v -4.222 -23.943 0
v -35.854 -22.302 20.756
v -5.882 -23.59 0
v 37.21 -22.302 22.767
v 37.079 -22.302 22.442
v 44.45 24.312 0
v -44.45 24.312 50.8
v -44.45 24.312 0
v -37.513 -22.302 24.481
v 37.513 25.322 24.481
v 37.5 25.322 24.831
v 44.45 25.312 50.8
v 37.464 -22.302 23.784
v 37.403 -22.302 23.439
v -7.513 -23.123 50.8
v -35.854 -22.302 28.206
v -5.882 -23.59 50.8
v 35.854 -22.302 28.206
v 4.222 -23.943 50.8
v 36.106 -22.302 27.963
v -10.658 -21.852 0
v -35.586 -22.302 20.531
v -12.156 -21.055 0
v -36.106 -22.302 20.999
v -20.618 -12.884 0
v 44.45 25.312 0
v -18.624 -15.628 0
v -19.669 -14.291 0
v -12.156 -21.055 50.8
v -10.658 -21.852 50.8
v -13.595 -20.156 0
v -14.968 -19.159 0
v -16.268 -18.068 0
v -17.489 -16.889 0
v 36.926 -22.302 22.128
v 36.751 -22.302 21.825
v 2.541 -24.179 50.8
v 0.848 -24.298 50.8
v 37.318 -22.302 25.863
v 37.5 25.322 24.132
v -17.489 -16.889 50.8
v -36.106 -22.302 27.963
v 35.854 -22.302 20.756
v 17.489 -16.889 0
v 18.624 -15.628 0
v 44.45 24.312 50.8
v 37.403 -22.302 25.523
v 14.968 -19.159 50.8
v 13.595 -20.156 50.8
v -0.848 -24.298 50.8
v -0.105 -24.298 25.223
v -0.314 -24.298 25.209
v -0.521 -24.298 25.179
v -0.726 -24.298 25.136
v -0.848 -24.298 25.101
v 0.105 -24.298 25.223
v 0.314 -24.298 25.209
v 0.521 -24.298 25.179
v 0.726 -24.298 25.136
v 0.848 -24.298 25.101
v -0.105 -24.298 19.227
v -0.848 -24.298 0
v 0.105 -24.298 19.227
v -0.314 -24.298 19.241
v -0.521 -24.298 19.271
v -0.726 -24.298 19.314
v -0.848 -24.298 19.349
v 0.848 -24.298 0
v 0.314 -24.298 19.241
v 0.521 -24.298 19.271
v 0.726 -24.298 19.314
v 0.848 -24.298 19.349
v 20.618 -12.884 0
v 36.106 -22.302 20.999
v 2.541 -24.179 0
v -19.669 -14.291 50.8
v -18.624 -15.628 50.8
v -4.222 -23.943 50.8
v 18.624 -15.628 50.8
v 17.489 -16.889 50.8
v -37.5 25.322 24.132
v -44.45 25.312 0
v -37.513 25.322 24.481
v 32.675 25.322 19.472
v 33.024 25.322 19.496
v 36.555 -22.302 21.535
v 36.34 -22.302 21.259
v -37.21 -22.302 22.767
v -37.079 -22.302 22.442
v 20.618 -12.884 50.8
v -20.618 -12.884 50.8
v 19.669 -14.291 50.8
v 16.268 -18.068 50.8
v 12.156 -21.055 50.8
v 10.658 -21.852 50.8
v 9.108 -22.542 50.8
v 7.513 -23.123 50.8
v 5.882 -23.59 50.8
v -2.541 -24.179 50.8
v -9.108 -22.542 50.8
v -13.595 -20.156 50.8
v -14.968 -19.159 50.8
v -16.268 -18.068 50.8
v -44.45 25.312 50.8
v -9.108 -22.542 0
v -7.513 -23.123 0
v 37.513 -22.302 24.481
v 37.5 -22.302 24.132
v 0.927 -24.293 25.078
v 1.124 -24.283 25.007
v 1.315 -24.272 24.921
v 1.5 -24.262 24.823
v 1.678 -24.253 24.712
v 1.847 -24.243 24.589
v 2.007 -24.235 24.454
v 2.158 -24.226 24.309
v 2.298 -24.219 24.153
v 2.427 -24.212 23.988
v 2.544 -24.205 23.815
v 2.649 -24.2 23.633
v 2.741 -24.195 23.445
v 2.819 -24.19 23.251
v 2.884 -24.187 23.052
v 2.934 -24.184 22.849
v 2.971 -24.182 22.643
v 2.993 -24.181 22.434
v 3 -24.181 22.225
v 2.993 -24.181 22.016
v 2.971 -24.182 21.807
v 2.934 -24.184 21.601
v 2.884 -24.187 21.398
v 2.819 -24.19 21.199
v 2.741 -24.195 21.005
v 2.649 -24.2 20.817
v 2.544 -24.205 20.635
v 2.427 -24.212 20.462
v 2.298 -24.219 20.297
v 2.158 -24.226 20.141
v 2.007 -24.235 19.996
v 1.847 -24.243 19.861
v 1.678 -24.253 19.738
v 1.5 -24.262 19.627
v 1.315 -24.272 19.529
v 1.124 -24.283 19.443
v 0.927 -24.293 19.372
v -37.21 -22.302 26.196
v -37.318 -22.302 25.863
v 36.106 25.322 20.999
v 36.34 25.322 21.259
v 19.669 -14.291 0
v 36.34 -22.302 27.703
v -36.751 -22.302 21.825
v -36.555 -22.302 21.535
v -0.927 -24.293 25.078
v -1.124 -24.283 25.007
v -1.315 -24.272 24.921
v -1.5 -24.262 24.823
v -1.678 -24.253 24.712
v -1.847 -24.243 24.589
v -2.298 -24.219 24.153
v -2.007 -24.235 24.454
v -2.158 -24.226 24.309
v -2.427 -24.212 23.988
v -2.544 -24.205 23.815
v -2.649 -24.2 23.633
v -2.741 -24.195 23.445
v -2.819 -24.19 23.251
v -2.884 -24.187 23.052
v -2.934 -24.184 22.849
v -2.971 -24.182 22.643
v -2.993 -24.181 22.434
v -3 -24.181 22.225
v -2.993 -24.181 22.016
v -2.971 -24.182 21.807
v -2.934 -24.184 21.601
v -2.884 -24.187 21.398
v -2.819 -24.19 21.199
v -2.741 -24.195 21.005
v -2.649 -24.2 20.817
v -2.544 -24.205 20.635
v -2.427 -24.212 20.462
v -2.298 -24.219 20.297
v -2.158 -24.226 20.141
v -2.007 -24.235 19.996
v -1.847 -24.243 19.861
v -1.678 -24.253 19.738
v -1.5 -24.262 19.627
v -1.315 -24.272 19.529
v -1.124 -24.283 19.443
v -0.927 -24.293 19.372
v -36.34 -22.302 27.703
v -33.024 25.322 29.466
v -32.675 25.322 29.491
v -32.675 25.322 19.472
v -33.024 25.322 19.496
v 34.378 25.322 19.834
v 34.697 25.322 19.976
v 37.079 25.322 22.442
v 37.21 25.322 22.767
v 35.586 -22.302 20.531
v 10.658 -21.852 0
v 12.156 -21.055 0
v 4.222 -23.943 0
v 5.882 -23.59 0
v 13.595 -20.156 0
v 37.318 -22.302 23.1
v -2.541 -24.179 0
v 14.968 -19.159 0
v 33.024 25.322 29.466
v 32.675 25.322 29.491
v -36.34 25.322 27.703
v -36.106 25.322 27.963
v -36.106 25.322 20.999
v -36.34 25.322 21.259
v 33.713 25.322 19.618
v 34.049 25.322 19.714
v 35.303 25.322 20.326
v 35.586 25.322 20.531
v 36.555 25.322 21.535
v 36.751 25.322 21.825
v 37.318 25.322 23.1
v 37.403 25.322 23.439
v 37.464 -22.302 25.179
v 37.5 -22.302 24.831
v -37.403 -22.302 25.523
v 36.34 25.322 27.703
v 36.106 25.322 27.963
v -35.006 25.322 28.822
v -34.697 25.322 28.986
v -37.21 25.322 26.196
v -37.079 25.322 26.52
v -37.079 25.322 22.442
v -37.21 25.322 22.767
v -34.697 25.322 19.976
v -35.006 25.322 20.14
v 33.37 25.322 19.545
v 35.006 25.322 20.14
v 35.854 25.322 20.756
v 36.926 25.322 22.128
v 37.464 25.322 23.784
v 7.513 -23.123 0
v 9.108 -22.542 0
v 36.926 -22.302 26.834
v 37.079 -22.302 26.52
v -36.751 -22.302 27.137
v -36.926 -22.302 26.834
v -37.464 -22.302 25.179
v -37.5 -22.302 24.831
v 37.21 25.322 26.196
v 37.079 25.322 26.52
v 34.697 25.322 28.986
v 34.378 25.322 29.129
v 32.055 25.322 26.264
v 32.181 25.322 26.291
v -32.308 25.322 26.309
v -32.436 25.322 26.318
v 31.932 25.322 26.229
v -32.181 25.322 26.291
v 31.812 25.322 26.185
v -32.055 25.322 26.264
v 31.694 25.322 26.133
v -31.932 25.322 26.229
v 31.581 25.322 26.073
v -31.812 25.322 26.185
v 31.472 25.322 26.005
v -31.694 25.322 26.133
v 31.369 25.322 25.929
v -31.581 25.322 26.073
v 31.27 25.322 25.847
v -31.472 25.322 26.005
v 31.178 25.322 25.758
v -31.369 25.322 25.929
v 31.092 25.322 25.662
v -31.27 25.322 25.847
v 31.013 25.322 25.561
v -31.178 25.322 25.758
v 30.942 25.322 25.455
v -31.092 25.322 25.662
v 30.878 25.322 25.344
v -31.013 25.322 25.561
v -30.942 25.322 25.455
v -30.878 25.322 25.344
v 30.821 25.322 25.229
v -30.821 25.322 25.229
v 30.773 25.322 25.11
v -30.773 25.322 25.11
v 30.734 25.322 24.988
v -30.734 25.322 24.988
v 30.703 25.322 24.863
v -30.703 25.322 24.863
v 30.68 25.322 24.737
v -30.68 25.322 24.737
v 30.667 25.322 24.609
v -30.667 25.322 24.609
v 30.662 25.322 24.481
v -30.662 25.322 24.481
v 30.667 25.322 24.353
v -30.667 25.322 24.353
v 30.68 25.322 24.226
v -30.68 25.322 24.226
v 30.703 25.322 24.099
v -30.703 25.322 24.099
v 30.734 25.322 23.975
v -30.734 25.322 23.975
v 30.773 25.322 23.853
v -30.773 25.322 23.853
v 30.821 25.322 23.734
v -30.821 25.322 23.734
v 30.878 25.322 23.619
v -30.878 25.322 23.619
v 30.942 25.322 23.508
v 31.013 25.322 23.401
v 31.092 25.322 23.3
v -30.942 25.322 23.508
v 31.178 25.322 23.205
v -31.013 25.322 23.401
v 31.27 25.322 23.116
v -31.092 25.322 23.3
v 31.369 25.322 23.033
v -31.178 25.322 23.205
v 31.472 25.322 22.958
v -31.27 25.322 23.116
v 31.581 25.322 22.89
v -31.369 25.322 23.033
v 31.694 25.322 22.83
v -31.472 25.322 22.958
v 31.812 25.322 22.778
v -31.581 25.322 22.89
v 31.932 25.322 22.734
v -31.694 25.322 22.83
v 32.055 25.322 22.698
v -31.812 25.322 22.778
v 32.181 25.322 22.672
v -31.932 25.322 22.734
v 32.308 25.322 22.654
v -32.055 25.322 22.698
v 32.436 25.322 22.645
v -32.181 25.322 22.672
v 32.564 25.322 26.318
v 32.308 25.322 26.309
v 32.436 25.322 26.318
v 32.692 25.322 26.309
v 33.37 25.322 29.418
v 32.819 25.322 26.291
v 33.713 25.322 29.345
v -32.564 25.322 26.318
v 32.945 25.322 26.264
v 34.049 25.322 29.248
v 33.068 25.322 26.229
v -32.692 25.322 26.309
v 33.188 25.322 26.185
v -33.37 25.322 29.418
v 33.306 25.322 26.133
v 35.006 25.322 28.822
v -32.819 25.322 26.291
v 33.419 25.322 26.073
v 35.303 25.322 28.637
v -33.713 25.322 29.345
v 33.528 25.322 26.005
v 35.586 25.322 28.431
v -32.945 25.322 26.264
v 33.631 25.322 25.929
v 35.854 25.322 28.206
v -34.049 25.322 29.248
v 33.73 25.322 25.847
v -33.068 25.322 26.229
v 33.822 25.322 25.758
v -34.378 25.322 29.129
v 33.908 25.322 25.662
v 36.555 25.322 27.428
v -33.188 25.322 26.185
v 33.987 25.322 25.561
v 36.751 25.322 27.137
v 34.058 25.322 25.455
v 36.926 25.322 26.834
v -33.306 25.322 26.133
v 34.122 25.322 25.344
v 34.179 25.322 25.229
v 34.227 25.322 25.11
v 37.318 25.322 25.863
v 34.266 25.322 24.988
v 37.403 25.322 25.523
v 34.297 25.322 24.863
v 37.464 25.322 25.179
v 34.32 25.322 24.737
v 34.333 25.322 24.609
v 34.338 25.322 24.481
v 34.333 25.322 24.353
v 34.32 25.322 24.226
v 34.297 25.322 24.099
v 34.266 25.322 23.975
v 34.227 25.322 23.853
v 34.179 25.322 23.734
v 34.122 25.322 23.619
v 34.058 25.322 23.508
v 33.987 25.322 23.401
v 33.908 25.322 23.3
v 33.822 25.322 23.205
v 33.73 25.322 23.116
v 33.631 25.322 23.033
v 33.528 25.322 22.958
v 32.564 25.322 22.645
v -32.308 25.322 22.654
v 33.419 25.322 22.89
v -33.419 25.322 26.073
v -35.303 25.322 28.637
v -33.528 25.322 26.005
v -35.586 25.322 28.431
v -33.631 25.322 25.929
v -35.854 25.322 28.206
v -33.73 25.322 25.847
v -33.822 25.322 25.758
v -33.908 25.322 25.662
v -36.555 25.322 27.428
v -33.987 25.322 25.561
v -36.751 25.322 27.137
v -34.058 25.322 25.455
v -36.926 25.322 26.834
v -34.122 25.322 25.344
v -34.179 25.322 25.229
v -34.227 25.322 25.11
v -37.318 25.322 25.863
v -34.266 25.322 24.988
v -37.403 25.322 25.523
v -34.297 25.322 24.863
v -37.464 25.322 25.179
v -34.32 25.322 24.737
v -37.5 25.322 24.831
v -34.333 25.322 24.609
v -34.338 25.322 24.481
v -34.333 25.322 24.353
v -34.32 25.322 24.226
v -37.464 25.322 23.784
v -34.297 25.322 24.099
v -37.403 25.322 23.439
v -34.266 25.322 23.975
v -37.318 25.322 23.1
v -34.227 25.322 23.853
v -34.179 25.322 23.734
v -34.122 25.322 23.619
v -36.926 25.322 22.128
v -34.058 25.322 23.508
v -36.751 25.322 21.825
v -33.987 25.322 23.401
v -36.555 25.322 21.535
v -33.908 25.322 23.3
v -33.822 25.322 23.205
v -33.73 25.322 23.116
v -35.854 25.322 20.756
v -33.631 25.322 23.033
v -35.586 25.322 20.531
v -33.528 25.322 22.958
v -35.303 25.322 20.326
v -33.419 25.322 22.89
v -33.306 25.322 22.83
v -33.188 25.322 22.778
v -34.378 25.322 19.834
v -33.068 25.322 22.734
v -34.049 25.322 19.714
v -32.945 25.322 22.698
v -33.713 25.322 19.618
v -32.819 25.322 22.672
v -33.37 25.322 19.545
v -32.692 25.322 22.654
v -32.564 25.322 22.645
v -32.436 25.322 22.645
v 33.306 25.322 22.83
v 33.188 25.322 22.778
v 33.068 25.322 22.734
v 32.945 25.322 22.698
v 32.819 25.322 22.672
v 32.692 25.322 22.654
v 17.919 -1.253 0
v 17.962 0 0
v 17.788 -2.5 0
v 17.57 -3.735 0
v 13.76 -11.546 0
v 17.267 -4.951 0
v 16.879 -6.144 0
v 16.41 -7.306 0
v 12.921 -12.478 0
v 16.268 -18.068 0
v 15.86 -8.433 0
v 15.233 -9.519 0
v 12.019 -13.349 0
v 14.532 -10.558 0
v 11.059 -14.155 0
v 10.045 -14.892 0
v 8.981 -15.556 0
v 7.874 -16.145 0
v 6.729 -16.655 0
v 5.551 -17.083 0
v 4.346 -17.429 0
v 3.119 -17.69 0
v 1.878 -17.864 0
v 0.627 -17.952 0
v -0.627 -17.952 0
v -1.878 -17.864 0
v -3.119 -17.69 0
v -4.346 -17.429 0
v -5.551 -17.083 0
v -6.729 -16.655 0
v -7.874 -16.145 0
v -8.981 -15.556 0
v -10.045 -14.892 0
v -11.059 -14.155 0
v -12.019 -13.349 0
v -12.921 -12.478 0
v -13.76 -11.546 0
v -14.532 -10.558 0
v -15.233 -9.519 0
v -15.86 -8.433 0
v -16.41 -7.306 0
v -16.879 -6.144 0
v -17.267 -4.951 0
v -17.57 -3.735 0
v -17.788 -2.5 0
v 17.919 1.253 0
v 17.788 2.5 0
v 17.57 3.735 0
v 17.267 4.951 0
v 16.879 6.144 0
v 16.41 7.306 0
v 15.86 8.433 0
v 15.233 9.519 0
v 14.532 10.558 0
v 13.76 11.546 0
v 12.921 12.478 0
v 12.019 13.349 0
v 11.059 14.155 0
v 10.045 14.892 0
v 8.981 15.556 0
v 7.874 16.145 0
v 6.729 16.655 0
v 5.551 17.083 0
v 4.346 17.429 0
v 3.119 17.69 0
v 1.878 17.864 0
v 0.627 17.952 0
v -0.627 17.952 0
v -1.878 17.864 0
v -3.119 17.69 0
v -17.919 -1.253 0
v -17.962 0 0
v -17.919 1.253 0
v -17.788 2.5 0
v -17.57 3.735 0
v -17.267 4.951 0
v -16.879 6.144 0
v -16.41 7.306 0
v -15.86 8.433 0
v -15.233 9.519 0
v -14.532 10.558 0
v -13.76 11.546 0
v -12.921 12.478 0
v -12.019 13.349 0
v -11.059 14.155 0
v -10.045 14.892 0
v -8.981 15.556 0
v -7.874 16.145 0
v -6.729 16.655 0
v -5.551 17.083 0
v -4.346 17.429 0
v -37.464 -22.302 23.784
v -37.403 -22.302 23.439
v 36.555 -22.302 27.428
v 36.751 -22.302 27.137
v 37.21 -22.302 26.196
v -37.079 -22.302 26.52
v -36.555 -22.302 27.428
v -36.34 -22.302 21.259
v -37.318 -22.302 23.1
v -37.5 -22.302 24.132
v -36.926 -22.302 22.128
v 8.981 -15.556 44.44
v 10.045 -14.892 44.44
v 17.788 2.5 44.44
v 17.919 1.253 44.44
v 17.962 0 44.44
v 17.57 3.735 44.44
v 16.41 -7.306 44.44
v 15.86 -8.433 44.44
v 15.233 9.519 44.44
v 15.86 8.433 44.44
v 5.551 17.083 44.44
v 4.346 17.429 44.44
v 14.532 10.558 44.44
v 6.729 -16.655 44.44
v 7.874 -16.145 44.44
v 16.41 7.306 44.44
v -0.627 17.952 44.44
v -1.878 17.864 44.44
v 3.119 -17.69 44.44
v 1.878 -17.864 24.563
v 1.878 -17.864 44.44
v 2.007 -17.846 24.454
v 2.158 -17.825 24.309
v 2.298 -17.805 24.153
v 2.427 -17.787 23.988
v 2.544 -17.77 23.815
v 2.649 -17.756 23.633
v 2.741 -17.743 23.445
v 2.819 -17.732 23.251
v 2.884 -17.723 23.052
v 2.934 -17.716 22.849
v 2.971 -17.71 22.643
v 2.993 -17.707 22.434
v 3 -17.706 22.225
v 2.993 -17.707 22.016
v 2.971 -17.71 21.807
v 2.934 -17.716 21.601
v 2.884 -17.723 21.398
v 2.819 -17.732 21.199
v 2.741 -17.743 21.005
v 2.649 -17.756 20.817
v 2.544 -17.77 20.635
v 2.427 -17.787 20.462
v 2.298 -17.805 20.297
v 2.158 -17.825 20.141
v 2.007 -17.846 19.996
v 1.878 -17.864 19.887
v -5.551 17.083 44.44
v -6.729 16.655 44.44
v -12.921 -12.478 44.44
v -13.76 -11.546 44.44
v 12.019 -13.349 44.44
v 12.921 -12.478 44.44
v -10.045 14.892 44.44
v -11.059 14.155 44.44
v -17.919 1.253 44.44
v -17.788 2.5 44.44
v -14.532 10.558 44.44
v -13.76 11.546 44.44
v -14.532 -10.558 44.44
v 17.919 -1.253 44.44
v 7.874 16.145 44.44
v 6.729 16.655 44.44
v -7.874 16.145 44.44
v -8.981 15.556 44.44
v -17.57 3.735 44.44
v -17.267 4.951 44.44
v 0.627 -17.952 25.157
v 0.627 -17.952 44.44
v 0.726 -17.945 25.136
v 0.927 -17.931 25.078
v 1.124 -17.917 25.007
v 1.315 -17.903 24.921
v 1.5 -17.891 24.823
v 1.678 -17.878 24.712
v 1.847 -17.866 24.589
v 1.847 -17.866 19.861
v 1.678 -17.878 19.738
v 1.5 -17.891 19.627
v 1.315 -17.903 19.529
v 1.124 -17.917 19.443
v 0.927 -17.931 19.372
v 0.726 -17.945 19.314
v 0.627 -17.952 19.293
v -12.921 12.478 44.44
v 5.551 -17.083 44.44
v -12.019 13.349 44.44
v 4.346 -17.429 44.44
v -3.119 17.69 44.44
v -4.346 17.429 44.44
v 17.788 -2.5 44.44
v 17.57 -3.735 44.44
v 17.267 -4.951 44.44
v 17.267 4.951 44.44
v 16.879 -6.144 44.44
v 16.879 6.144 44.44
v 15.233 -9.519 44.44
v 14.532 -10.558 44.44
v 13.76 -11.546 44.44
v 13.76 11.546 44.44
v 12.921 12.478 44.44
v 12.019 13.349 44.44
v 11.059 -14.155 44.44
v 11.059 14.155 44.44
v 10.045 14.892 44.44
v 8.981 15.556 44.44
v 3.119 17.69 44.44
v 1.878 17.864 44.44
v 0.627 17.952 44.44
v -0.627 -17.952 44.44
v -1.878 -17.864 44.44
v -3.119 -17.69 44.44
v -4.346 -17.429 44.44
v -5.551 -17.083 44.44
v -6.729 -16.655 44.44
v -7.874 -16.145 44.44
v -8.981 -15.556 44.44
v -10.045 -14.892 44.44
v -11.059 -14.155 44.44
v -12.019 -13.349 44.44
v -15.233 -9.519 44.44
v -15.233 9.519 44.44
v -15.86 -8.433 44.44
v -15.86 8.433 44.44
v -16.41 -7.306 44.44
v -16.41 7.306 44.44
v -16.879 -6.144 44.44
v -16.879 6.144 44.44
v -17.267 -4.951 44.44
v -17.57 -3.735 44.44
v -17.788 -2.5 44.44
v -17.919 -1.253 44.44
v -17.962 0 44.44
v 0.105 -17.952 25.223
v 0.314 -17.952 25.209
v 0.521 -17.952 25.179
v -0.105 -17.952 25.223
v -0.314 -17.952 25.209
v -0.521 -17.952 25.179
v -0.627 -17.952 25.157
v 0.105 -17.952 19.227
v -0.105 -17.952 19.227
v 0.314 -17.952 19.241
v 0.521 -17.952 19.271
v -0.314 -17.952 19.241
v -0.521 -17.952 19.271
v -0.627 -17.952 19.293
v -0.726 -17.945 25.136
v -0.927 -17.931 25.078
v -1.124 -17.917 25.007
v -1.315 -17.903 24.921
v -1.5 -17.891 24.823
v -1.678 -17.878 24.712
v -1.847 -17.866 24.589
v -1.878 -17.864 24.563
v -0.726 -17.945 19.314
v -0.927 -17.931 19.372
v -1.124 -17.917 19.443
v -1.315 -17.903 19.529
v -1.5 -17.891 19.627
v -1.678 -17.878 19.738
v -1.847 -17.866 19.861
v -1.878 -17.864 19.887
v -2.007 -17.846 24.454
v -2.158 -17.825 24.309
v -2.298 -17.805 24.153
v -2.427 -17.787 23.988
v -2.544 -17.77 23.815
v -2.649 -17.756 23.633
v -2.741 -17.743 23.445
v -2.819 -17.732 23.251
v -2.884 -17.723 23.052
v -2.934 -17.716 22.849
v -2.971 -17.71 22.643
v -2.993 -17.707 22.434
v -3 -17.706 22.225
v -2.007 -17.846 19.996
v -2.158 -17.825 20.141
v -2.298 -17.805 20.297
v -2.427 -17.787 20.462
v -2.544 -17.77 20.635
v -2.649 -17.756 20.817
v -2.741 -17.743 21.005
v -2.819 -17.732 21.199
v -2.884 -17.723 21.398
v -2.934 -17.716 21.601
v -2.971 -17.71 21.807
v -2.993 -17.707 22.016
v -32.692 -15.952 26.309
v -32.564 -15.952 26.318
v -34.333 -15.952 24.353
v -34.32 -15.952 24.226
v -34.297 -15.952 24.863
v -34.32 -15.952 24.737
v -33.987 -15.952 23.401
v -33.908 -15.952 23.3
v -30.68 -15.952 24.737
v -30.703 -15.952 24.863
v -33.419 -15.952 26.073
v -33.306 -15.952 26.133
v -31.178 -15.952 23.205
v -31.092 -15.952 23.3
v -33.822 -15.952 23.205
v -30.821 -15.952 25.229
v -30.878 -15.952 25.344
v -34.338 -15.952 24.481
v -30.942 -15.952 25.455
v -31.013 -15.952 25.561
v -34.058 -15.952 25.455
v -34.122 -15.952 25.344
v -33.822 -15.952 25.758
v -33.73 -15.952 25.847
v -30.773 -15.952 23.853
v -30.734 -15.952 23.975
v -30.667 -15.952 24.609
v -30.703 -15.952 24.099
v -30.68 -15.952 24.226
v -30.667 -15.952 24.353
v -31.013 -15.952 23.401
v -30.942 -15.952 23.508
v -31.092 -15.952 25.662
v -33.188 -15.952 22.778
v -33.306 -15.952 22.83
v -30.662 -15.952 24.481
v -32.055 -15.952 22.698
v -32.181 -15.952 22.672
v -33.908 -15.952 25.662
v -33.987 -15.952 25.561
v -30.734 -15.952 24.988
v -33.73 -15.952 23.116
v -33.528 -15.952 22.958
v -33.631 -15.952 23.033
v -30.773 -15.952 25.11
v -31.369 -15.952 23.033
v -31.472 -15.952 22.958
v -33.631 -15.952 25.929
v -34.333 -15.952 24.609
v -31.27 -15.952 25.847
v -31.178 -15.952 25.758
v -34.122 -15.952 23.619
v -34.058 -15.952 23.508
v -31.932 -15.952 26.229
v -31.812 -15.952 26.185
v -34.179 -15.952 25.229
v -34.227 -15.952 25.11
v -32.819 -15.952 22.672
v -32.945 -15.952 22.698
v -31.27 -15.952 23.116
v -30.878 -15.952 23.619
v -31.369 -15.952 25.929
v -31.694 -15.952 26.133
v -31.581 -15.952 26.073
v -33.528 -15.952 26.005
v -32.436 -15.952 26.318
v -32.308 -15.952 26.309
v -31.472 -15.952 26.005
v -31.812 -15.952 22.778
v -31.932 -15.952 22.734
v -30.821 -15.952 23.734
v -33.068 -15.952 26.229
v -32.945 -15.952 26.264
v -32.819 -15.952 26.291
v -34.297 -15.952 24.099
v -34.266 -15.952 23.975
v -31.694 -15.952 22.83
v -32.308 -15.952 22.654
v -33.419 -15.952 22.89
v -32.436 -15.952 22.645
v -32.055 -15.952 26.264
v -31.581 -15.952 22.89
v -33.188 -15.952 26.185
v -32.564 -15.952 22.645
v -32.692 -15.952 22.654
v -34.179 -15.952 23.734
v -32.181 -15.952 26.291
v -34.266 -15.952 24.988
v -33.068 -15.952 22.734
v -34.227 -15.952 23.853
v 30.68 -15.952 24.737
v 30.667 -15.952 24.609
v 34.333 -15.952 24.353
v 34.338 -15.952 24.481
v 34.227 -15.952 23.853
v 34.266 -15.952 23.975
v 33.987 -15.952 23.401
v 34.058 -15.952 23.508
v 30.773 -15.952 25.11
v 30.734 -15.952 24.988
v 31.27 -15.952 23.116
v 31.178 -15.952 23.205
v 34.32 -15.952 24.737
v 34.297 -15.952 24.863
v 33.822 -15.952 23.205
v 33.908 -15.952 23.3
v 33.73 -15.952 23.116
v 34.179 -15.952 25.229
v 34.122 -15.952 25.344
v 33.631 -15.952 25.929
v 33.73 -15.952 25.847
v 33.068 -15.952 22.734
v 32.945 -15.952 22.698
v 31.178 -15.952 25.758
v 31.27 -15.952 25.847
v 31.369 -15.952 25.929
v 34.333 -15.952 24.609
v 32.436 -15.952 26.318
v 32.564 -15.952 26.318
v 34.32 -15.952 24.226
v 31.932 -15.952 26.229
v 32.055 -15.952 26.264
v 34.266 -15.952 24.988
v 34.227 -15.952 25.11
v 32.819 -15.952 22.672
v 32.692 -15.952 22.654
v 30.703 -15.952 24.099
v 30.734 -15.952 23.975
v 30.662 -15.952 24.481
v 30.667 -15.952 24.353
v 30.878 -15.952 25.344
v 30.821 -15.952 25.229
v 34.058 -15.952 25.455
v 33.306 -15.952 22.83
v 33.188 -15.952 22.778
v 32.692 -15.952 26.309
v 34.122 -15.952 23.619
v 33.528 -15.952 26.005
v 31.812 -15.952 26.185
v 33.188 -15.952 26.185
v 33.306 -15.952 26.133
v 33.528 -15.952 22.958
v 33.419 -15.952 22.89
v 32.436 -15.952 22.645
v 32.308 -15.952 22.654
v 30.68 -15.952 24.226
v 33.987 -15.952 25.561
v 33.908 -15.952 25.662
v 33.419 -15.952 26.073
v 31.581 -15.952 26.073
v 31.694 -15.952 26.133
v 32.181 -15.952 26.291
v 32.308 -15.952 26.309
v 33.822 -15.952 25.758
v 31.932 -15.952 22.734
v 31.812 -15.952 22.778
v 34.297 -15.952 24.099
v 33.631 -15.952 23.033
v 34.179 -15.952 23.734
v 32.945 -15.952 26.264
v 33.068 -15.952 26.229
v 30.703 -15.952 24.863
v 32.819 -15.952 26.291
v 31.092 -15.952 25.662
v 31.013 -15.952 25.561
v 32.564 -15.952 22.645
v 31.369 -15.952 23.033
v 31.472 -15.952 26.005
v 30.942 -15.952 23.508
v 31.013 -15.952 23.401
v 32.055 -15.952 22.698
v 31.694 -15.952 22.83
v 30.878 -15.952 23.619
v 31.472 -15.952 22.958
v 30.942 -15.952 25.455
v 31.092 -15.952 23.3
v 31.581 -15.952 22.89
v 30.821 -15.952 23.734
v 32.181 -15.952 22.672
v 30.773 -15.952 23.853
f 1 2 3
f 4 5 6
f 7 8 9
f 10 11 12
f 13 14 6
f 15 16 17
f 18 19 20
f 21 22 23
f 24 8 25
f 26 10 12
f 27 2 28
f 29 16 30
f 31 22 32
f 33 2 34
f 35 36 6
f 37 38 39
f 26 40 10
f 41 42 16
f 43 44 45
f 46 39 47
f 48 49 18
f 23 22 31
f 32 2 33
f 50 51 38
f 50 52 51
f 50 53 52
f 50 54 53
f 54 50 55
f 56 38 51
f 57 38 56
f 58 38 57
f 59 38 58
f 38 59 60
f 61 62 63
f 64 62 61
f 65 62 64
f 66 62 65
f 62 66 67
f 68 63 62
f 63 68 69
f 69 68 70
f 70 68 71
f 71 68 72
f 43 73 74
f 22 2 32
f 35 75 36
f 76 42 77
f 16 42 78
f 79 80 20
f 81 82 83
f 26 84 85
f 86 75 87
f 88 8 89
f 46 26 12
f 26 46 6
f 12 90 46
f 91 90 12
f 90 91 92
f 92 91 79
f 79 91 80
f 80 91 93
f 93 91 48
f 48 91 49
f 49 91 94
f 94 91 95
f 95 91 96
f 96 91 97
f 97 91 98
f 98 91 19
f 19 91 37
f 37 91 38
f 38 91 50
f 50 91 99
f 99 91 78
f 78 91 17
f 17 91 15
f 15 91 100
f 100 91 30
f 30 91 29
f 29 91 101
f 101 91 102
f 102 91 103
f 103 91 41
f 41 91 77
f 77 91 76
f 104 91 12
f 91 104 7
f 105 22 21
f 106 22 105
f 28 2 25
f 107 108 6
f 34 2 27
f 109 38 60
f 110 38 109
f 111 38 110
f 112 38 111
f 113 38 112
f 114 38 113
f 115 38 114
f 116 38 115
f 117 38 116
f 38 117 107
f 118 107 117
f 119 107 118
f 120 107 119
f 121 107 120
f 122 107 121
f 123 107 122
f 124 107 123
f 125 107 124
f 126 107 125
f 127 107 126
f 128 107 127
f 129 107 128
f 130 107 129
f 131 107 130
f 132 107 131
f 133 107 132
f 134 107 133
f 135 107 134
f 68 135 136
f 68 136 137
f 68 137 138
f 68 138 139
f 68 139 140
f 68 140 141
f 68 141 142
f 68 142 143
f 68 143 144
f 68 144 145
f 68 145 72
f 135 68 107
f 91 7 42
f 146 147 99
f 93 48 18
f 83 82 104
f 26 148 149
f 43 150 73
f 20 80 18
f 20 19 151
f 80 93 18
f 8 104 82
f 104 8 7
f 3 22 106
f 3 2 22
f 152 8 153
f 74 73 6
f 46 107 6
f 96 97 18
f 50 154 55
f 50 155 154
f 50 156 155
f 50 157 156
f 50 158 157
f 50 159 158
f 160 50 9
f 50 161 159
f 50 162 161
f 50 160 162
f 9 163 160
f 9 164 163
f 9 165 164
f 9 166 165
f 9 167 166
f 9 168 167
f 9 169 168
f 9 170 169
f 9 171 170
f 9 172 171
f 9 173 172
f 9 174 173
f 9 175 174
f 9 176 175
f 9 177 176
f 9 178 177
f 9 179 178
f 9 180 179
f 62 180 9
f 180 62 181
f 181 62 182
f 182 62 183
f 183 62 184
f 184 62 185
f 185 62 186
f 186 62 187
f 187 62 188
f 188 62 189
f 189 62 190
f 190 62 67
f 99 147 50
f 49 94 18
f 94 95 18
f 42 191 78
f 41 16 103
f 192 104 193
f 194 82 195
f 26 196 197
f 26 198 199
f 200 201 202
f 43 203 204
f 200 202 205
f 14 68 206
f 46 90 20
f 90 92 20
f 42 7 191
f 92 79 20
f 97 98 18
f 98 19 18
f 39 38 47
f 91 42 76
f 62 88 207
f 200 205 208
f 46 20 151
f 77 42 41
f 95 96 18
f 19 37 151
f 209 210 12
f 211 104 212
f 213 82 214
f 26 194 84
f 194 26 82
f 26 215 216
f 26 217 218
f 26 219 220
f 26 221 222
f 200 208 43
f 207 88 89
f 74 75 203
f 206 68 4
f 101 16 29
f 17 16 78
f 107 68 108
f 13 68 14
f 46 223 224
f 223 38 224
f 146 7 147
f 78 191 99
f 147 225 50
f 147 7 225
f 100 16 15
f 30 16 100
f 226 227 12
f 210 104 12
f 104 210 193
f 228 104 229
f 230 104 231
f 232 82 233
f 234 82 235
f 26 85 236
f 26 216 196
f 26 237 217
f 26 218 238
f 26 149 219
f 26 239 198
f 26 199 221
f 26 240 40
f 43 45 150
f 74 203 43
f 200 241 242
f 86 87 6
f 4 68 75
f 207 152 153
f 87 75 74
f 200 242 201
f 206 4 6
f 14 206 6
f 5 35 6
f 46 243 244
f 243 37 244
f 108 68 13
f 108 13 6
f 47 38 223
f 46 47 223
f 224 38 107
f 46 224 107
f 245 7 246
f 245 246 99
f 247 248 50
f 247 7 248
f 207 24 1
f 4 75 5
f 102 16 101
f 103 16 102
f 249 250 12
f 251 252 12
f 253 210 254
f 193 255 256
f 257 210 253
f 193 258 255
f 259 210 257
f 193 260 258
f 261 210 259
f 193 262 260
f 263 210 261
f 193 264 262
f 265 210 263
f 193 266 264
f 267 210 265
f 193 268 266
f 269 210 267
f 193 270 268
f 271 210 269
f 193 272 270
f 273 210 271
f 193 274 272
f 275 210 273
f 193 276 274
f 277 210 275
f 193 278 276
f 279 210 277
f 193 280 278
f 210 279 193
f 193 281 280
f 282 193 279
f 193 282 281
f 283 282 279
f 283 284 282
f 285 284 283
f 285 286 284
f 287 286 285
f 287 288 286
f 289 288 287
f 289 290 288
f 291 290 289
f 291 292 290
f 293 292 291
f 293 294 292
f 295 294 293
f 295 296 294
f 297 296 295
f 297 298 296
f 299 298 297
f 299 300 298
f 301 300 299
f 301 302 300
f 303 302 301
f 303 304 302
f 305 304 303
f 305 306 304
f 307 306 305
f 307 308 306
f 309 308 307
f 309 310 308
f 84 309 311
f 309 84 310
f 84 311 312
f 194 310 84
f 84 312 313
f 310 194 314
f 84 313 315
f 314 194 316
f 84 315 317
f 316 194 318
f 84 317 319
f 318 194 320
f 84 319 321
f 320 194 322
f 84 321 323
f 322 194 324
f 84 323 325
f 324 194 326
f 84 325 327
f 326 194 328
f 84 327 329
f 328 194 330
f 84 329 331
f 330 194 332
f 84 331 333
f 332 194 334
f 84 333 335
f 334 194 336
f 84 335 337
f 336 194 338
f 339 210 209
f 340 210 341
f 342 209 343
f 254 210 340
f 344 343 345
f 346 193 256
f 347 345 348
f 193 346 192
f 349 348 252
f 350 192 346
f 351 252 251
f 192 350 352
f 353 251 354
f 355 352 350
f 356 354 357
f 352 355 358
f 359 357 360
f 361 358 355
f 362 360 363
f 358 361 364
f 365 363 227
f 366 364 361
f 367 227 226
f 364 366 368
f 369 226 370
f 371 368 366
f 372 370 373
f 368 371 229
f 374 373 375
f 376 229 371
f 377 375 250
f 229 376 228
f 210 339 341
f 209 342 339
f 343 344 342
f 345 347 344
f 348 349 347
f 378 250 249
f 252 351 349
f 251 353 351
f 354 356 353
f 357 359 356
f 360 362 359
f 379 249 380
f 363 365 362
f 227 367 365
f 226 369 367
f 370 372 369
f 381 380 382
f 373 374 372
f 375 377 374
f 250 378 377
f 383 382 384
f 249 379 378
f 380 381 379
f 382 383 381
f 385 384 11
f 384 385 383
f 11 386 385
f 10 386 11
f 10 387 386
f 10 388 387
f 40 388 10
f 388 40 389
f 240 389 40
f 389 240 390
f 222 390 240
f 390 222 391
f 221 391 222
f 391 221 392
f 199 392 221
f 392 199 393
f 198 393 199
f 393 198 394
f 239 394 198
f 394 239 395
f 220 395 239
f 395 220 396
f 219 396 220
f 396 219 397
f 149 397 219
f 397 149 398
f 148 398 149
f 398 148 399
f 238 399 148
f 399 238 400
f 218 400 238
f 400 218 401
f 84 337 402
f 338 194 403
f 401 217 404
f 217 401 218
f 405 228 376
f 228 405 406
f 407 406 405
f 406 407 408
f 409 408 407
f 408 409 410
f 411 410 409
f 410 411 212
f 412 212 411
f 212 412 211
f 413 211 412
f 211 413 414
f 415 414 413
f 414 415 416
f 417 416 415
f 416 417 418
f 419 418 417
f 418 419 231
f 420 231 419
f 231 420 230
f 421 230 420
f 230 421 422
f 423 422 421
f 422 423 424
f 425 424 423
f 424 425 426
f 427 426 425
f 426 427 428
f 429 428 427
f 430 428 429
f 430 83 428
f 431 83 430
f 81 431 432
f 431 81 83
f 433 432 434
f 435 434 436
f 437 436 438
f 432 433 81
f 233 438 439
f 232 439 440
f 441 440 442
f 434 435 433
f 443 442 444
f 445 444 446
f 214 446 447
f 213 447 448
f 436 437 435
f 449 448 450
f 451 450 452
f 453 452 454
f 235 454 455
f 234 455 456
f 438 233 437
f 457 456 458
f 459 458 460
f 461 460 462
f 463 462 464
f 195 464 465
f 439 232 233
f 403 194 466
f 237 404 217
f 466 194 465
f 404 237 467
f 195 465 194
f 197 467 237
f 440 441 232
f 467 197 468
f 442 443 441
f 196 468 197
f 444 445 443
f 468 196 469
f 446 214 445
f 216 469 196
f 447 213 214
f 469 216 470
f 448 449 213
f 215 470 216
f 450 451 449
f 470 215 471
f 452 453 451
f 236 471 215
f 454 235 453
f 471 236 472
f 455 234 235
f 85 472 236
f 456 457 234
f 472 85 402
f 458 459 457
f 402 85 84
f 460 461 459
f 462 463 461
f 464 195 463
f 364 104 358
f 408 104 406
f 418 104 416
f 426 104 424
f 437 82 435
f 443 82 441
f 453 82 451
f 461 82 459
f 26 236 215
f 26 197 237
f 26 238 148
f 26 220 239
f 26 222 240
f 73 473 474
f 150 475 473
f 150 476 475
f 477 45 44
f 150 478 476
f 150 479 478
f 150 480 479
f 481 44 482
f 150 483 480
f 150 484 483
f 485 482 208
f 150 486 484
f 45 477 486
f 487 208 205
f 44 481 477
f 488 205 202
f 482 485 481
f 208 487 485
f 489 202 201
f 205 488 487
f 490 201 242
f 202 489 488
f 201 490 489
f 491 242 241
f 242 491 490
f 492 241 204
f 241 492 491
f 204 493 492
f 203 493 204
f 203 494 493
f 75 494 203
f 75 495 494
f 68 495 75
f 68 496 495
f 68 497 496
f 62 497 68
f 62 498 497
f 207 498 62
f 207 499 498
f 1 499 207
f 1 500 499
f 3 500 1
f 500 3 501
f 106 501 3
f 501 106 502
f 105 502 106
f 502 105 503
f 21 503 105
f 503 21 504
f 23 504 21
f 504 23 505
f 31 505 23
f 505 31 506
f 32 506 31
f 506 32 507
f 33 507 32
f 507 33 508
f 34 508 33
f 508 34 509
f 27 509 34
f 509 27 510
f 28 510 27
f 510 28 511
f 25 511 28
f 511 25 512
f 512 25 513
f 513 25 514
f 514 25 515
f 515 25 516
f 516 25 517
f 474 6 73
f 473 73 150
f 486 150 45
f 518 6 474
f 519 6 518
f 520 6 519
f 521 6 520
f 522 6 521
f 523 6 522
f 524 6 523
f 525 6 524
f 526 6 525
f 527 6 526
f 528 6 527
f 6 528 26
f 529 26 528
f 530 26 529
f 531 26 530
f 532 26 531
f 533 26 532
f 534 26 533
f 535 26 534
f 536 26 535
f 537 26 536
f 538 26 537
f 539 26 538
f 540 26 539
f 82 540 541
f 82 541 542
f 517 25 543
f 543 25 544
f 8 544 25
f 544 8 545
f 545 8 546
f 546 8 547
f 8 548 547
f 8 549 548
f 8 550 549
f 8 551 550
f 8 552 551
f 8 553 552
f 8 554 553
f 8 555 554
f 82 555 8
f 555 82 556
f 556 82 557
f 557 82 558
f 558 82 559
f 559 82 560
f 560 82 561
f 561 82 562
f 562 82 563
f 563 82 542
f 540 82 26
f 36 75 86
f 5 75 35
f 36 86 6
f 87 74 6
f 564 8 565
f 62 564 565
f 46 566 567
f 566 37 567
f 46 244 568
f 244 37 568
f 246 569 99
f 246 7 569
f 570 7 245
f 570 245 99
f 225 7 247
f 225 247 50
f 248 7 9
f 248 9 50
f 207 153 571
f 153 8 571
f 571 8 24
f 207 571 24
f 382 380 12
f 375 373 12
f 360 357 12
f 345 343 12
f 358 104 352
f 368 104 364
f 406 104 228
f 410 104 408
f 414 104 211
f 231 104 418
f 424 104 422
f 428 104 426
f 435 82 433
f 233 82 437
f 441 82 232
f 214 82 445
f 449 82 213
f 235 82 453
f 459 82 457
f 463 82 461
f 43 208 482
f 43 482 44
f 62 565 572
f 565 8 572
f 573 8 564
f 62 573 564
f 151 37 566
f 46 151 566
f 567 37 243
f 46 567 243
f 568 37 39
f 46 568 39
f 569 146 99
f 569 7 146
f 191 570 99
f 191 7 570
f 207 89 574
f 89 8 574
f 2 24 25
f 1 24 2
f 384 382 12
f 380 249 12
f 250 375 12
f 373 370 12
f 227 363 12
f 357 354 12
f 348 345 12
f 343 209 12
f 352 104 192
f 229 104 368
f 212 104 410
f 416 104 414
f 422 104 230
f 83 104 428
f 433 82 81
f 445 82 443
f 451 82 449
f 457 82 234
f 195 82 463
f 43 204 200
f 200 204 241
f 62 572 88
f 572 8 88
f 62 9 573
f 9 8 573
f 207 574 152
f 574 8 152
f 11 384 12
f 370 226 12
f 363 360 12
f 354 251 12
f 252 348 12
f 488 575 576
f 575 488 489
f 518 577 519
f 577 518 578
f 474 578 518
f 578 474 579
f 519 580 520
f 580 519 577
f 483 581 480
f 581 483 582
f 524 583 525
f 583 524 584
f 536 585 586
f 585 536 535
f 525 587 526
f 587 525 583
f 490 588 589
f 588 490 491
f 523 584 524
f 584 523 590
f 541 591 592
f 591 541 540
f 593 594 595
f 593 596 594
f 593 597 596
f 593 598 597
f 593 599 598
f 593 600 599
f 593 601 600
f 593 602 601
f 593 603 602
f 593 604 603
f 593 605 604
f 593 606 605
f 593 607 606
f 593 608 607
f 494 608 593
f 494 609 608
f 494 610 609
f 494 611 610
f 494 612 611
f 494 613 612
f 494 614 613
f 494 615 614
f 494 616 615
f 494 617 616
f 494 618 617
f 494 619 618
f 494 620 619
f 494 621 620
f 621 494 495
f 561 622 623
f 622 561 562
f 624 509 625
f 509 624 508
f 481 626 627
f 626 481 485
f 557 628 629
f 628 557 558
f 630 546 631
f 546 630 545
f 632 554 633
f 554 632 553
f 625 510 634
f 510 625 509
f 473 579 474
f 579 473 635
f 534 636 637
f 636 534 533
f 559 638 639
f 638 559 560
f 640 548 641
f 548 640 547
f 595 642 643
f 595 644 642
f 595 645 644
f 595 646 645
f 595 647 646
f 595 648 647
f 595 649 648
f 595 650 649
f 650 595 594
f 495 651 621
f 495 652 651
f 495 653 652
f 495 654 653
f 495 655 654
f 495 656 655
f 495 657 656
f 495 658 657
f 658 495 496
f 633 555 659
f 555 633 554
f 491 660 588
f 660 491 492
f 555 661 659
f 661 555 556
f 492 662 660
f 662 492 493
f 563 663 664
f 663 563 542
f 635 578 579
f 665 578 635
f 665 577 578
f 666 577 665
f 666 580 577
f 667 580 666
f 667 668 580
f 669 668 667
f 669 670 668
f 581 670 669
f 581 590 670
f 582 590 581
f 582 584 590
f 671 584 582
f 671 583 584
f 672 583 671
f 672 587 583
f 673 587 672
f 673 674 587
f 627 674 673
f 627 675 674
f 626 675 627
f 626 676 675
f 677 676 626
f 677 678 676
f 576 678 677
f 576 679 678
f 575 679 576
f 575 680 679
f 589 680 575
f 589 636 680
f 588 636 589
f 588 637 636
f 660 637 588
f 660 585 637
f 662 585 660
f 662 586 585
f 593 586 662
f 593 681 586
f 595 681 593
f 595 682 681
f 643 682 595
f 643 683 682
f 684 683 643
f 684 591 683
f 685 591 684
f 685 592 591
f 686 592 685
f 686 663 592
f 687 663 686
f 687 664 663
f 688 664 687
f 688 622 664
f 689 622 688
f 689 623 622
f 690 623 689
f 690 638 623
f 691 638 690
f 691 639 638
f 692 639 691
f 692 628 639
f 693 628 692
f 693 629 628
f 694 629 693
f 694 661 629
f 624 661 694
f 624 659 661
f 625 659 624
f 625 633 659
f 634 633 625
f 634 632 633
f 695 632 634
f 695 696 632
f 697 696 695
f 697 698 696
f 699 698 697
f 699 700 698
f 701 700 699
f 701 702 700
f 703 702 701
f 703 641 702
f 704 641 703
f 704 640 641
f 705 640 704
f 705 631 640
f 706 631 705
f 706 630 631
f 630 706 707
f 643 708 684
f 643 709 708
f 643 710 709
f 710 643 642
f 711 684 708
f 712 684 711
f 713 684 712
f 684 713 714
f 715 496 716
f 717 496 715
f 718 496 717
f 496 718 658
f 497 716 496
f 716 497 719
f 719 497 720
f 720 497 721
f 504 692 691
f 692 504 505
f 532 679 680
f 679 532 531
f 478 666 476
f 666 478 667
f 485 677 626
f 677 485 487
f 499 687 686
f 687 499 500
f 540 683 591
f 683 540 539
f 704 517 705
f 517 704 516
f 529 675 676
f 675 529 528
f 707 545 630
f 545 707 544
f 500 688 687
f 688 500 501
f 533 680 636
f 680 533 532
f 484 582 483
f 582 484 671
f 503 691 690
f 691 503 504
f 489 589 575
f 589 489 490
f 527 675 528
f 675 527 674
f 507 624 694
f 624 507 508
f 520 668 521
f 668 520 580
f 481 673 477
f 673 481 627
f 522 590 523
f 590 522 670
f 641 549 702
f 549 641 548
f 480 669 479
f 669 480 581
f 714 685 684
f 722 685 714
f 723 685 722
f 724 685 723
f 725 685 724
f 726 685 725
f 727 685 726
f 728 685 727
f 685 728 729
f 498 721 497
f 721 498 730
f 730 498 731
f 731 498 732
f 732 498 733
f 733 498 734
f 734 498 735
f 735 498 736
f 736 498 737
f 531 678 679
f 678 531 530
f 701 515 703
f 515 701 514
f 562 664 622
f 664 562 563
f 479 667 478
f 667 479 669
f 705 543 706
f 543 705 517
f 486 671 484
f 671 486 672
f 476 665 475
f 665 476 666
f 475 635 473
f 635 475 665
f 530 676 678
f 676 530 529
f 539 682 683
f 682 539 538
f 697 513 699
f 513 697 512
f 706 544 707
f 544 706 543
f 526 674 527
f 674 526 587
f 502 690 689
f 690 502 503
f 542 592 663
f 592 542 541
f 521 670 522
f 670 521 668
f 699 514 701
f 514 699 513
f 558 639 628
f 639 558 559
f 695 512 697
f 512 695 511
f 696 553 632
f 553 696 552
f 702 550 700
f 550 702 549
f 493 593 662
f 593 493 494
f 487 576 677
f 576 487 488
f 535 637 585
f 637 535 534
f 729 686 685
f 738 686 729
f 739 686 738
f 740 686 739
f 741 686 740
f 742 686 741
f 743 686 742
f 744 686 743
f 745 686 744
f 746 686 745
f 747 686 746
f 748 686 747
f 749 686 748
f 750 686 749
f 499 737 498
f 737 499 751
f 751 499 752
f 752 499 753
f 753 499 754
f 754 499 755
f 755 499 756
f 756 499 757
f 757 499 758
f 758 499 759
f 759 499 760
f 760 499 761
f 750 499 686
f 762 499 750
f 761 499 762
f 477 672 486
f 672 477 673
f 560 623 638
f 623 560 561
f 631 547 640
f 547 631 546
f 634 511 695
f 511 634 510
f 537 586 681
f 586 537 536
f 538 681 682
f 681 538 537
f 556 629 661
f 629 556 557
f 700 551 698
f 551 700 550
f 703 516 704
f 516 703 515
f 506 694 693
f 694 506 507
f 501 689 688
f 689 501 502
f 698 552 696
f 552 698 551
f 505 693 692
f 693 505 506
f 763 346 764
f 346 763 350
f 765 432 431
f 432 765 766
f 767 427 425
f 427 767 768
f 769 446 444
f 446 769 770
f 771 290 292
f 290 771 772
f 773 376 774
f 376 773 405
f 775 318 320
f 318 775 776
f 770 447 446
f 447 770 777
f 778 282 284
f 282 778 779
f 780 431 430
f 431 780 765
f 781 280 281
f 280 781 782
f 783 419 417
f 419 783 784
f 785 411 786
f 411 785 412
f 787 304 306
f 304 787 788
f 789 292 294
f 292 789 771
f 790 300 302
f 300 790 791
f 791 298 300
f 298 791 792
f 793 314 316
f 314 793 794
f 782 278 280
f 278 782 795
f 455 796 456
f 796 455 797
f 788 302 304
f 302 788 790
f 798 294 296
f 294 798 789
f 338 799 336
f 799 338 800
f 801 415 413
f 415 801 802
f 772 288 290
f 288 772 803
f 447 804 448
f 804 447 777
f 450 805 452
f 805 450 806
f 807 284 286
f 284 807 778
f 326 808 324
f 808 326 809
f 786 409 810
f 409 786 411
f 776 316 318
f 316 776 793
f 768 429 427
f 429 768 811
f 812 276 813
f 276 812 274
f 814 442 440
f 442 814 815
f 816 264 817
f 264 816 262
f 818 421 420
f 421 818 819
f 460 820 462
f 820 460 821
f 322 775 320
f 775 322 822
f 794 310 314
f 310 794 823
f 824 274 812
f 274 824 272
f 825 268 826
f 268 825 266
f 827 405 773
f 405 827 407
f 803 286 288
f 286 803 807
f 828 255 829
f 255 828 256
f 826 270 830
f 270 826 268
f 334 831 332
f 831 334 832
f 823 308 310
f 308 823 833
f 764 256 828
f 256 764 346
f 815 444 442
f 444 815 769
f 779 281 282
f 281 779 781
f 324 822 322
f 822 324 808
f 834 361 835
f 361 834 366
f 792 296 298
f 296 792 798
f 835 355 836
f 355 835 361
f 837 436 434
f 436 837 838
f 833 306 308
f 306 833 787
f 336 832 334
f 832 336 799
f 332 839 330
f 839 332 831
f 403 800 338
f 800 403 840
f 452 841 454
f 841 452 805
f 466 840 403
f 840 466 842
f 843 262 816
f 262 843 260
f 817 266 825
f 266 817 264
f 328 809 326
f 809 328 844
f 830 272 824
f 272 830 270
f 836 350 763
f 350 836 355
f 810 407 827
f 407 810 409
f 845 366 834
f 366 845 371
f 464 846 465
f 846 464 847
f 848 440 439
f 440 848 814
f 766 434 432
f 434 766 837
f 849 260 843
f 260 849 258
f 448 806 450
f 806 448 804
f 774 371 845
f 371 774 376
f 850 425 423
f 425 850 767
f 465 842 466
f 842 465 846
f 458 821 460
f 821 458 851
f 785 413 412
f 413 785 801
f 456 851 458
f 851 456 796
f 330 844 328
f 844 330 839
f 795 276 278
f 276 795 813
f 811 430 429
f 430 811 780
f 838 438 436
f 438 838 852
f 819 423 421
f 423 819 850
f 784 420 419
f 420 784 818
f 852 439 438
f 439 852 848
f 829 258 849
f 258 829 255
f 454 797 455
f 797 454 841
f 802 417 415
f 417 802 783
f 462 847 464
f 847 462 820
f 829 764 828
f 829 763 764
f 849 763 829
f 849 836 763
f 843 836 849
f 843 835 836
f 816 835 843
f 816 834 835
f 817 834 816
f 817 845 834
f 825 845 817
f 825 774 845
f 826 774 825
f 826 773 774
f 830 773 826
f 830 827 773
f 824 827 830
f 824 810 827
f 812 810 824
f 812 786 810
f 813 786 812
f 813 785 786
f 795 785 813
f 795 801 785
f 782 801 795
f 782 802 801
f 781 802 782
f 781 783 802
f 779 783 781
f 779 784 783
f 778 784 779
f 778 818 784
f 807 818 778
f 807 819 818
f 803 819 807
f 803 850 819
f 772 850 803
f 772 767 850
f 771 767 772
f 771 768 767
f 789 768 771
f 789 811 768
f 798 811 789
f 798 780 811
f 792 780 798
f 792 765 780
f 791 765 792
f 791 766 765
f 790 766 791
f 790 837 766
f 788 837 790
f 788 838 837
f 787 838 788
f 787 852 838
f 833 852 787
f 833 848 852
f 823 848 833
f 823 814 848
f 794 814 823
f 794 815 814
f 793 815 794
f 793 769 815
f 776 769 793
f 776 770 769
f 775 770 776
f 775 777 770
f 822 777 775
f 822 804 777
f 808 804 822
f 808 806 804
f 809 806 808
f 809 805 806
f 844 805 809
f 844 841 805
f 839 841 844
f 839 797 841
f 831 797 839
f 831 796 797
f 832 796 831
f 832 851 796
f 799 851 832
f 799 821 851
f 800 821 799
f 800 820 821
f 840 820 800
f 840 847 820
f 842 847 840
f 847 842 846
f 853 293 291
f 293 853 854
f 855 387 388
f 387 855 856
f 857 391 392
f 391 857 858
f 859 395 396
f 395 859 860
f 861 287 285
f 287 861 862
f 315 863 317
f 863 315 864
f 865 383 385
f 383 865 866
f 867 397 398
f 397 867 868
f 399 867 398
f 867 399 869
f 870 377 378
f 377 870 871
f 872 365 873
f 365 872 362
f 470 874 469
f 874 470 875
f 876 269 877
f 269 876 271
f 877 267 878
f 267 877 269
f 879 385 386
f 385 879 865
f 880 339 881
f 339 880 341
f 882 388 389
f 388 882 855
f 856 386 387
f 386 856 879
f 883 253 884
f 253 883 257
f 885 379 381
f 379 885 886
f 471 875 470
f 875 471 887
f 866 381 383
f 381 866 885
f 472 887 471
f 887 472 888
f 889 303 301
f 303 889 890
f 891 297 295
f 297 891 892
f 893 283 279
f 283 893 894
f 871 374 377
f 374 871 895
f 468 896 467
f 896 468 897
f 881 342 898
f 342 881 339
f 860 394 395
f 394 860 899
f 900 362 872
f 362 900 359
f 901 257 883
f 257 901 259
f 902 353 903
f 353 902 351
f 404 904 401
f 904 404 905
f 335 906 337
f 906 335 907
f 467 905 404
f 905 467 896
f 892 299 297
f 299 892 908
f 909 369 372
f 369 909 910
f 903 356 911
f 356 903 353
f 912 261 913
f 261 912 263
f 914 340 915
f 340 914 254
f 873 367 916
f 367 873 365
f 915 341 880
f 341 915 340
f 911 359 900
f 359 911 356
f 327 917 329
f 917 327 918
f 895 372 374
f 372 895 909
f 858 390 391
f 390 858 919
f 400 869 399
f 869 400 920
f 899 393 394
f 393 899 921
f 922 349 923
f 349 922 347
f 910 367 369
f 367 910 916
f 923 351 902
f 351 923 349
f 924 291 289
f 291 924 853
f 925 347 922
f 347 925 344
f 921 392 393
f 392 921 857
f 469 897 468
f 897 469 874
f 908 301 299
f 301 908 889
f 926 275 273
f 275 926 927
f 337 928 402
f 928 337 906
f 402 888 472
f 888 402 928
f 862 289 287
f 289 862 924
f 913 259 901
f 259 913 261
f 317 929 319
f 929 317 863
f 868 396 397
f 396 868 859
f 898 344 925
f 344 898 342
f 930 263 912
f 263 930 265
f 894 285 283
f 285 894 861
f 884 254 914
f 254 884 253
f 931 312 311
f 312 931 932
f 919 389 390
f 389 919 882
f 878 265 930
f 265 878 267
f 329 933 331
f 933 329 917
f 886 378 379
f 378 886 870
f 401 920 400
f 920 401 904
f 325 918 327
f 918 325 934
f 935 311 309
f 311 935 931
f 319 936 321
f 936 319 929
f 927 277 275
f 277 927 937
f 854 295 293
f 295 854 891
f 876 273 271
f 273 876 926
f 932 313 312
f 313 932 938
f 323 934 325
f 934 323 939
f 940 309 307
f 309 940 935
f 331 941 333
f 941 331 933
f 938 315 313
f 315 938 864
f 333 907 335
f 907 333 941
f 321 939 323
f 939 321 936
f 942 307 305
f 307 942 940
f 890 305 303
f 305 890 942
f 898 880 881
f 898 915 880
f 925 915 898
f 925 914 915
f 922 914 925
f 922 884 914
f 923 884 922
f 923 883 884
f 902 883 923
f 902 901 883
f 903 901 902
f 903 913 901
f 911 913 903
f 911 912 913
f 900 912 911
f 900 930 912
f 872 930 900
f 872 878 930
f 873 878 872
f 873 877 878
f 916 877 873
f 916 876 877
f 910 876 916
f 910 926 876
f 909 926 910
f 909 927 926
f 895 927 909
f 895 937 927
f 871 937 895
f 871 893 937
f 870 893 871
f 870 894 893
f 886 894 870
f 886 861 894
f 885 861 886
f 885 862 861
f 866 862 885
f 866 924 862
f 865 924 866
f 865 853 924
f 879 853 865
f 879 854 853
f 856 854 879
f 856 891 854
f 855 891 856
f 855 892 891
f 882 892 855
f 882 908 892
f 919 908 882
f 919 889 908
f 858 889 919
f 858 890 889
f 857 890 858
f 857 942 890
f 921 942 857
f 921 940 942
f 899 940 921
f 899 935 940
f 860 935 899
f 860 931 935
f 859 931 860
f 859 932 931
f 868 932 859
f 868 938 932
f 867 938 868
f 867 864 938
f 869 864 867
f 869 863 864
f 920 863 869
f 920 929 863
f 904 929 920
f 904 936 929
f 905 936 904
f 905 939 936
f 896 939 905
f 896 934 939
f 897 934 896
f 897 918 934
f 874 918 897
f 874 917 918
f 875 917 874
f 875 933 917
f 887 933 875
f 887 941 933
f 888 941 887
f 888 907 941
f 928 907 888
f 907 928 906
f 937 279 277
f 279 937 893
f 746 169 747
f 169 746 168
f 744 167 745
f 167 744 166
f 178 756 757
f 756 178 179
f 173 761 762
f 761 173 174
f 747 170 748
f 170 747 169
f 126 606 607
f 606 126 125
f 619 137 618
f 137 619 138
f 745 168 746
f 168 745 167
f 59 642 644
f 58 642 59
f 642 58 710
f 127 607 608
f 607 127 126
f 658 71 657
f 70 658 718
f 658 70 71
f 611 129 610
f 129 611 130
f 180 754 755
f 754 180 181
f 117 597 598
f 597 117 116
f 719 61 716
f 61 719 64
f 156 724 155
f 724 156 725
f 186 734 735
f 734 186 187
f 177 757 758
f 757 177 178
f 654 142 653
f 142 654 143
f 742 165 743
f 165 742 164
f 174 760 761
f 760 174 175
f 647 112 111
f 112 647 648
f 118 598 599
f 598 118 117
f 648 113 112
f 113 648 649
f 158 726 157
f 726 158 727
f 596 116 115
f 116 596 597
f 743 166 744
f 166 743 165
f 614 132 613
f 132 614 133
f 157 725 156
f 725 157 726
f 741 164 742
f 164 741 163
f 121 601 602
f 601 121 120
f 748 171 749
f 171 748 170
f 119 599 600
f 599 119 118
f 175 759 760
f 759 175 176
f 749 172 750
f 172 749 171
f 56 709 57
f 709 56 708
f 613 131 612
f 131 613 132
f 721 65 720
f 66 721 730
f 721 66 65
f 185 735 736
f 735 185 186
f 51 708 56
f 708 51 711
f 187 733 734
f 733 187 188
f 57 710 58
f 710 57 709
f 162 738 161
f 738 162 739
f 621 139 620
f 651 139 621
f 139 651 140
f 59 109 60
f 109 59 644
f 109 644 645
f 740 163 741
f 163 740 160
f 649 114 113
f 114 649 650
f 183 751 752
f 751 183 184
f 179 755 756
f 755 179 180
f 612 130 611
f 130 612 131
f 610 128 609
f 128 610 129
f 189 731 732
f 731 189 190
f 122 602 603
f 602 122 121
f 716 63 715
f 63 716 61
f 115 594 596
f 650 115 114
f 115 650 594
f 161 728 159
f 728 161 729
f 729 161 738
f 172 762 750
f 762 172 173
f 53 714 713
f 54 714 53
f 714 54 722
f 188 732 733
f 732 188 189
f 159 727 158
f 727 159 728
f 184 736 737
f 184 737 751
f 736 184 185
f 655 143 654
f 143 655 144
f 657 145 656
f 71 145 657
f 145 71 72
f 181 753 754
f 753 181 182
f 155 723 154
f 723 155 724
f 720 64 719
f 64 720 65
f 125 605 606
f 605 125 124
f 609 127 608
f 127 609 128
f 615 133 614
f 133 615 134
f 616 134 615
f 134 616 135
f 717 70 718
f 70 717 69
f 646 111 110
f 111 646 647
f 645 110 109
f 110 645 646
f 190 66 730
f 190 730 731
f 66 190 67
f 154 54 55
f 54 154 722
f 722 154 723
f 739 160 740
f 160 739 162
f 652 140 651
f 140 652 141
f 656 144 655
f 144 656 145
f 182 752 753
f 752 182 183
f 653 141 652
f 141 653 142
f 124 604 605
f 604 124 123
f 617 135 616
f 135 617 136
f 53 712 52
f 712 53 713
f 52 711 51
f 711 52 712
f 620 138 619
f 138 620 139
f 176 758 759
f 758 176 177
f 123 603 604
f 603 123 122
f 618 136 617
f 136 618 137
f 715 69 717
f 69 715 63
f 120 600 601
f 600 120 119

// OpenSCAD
// Version 2 - Brian Bousman 6/22/2017
//      slight modification of Phil's original to move mounting screws closer together
//      and add a tension screw at the back

$fn = 90;

in2mm = 25.4;

tripodDai = (1+3/8)*in2mm+1; 
mountHeight = 1.75*in2mm;
wallThickness = .25*in2mm;

//mountHoleDistance = (2+5/8)*in2mm+4;
mountHoleDistance = 65;    // measured with calipers
mountX = (3.5)*in2mm;
mountHoleDia = 1/8*in2mm+.5;
mountHoledepth = (1.625)*in2mm;
tensionHoleDia = 6;

module center_tube()
{
    cylinder(d=tripodDai, h=mountHeight);
}



module mount()
{
    difference()
    {
        hull()
        {
            cylinder(d=tripodDai+2*wallThickness, h=mountHeight+wallThickness);
            translate([-mountX/2, (tripodDai+2*wallThickness)/2, 0])cube([mountX,1,mountHeight+wallThickness]);
            
        translate([-(mountHoleDistance)/2,(tripodDai+2*wallThickness)/2+1.01,(mountHeight+wallThickness-mountHoleDia/2)/2])rotate([90,0,0])cylinder(d=mountHoleDia+wallThickness, h=mountHoledepth+wallThickness);
        translate([(mountHoleDistance)/2,(tripodDai+2*wallThickness)/2+1.01,(mountHeight+wallThickness-mountHoleDia/2)/2])rotate([90,0,0])cylinder(d=mountHoleDia+wallThickness, h=mountHoledepth+wallThickness);
        }
        translate([0,0,-0.01])center_tube();
        //hole
        translate([-(mountHoleDistance)/2,(tripodDai+2*wallThickness)/2+1.01,(mountHeight+wallThickness-mountHoleDia/2)/2])rotate([90,0,0])cylinder(d=mountHoleDia, h=mountHoledepth);
        translate([(mountHoleDistance)/2,(tripodDai+2*wallThickness)/2+1.01,(mountHeight+wallThickness-mountHoleDia/2)/2])rotate([90,0,0])cylinder(d=mountHoleDia, h=mountHoledepth);
        // tension screw hole
        translate([0,-(tripodDai+2*wallThickness)/2,mountHeight/2])rotate([90,0,-180])cylinder(d=tensionHoleDia, h=mountHoledepth);
        
    }
}

mount();
